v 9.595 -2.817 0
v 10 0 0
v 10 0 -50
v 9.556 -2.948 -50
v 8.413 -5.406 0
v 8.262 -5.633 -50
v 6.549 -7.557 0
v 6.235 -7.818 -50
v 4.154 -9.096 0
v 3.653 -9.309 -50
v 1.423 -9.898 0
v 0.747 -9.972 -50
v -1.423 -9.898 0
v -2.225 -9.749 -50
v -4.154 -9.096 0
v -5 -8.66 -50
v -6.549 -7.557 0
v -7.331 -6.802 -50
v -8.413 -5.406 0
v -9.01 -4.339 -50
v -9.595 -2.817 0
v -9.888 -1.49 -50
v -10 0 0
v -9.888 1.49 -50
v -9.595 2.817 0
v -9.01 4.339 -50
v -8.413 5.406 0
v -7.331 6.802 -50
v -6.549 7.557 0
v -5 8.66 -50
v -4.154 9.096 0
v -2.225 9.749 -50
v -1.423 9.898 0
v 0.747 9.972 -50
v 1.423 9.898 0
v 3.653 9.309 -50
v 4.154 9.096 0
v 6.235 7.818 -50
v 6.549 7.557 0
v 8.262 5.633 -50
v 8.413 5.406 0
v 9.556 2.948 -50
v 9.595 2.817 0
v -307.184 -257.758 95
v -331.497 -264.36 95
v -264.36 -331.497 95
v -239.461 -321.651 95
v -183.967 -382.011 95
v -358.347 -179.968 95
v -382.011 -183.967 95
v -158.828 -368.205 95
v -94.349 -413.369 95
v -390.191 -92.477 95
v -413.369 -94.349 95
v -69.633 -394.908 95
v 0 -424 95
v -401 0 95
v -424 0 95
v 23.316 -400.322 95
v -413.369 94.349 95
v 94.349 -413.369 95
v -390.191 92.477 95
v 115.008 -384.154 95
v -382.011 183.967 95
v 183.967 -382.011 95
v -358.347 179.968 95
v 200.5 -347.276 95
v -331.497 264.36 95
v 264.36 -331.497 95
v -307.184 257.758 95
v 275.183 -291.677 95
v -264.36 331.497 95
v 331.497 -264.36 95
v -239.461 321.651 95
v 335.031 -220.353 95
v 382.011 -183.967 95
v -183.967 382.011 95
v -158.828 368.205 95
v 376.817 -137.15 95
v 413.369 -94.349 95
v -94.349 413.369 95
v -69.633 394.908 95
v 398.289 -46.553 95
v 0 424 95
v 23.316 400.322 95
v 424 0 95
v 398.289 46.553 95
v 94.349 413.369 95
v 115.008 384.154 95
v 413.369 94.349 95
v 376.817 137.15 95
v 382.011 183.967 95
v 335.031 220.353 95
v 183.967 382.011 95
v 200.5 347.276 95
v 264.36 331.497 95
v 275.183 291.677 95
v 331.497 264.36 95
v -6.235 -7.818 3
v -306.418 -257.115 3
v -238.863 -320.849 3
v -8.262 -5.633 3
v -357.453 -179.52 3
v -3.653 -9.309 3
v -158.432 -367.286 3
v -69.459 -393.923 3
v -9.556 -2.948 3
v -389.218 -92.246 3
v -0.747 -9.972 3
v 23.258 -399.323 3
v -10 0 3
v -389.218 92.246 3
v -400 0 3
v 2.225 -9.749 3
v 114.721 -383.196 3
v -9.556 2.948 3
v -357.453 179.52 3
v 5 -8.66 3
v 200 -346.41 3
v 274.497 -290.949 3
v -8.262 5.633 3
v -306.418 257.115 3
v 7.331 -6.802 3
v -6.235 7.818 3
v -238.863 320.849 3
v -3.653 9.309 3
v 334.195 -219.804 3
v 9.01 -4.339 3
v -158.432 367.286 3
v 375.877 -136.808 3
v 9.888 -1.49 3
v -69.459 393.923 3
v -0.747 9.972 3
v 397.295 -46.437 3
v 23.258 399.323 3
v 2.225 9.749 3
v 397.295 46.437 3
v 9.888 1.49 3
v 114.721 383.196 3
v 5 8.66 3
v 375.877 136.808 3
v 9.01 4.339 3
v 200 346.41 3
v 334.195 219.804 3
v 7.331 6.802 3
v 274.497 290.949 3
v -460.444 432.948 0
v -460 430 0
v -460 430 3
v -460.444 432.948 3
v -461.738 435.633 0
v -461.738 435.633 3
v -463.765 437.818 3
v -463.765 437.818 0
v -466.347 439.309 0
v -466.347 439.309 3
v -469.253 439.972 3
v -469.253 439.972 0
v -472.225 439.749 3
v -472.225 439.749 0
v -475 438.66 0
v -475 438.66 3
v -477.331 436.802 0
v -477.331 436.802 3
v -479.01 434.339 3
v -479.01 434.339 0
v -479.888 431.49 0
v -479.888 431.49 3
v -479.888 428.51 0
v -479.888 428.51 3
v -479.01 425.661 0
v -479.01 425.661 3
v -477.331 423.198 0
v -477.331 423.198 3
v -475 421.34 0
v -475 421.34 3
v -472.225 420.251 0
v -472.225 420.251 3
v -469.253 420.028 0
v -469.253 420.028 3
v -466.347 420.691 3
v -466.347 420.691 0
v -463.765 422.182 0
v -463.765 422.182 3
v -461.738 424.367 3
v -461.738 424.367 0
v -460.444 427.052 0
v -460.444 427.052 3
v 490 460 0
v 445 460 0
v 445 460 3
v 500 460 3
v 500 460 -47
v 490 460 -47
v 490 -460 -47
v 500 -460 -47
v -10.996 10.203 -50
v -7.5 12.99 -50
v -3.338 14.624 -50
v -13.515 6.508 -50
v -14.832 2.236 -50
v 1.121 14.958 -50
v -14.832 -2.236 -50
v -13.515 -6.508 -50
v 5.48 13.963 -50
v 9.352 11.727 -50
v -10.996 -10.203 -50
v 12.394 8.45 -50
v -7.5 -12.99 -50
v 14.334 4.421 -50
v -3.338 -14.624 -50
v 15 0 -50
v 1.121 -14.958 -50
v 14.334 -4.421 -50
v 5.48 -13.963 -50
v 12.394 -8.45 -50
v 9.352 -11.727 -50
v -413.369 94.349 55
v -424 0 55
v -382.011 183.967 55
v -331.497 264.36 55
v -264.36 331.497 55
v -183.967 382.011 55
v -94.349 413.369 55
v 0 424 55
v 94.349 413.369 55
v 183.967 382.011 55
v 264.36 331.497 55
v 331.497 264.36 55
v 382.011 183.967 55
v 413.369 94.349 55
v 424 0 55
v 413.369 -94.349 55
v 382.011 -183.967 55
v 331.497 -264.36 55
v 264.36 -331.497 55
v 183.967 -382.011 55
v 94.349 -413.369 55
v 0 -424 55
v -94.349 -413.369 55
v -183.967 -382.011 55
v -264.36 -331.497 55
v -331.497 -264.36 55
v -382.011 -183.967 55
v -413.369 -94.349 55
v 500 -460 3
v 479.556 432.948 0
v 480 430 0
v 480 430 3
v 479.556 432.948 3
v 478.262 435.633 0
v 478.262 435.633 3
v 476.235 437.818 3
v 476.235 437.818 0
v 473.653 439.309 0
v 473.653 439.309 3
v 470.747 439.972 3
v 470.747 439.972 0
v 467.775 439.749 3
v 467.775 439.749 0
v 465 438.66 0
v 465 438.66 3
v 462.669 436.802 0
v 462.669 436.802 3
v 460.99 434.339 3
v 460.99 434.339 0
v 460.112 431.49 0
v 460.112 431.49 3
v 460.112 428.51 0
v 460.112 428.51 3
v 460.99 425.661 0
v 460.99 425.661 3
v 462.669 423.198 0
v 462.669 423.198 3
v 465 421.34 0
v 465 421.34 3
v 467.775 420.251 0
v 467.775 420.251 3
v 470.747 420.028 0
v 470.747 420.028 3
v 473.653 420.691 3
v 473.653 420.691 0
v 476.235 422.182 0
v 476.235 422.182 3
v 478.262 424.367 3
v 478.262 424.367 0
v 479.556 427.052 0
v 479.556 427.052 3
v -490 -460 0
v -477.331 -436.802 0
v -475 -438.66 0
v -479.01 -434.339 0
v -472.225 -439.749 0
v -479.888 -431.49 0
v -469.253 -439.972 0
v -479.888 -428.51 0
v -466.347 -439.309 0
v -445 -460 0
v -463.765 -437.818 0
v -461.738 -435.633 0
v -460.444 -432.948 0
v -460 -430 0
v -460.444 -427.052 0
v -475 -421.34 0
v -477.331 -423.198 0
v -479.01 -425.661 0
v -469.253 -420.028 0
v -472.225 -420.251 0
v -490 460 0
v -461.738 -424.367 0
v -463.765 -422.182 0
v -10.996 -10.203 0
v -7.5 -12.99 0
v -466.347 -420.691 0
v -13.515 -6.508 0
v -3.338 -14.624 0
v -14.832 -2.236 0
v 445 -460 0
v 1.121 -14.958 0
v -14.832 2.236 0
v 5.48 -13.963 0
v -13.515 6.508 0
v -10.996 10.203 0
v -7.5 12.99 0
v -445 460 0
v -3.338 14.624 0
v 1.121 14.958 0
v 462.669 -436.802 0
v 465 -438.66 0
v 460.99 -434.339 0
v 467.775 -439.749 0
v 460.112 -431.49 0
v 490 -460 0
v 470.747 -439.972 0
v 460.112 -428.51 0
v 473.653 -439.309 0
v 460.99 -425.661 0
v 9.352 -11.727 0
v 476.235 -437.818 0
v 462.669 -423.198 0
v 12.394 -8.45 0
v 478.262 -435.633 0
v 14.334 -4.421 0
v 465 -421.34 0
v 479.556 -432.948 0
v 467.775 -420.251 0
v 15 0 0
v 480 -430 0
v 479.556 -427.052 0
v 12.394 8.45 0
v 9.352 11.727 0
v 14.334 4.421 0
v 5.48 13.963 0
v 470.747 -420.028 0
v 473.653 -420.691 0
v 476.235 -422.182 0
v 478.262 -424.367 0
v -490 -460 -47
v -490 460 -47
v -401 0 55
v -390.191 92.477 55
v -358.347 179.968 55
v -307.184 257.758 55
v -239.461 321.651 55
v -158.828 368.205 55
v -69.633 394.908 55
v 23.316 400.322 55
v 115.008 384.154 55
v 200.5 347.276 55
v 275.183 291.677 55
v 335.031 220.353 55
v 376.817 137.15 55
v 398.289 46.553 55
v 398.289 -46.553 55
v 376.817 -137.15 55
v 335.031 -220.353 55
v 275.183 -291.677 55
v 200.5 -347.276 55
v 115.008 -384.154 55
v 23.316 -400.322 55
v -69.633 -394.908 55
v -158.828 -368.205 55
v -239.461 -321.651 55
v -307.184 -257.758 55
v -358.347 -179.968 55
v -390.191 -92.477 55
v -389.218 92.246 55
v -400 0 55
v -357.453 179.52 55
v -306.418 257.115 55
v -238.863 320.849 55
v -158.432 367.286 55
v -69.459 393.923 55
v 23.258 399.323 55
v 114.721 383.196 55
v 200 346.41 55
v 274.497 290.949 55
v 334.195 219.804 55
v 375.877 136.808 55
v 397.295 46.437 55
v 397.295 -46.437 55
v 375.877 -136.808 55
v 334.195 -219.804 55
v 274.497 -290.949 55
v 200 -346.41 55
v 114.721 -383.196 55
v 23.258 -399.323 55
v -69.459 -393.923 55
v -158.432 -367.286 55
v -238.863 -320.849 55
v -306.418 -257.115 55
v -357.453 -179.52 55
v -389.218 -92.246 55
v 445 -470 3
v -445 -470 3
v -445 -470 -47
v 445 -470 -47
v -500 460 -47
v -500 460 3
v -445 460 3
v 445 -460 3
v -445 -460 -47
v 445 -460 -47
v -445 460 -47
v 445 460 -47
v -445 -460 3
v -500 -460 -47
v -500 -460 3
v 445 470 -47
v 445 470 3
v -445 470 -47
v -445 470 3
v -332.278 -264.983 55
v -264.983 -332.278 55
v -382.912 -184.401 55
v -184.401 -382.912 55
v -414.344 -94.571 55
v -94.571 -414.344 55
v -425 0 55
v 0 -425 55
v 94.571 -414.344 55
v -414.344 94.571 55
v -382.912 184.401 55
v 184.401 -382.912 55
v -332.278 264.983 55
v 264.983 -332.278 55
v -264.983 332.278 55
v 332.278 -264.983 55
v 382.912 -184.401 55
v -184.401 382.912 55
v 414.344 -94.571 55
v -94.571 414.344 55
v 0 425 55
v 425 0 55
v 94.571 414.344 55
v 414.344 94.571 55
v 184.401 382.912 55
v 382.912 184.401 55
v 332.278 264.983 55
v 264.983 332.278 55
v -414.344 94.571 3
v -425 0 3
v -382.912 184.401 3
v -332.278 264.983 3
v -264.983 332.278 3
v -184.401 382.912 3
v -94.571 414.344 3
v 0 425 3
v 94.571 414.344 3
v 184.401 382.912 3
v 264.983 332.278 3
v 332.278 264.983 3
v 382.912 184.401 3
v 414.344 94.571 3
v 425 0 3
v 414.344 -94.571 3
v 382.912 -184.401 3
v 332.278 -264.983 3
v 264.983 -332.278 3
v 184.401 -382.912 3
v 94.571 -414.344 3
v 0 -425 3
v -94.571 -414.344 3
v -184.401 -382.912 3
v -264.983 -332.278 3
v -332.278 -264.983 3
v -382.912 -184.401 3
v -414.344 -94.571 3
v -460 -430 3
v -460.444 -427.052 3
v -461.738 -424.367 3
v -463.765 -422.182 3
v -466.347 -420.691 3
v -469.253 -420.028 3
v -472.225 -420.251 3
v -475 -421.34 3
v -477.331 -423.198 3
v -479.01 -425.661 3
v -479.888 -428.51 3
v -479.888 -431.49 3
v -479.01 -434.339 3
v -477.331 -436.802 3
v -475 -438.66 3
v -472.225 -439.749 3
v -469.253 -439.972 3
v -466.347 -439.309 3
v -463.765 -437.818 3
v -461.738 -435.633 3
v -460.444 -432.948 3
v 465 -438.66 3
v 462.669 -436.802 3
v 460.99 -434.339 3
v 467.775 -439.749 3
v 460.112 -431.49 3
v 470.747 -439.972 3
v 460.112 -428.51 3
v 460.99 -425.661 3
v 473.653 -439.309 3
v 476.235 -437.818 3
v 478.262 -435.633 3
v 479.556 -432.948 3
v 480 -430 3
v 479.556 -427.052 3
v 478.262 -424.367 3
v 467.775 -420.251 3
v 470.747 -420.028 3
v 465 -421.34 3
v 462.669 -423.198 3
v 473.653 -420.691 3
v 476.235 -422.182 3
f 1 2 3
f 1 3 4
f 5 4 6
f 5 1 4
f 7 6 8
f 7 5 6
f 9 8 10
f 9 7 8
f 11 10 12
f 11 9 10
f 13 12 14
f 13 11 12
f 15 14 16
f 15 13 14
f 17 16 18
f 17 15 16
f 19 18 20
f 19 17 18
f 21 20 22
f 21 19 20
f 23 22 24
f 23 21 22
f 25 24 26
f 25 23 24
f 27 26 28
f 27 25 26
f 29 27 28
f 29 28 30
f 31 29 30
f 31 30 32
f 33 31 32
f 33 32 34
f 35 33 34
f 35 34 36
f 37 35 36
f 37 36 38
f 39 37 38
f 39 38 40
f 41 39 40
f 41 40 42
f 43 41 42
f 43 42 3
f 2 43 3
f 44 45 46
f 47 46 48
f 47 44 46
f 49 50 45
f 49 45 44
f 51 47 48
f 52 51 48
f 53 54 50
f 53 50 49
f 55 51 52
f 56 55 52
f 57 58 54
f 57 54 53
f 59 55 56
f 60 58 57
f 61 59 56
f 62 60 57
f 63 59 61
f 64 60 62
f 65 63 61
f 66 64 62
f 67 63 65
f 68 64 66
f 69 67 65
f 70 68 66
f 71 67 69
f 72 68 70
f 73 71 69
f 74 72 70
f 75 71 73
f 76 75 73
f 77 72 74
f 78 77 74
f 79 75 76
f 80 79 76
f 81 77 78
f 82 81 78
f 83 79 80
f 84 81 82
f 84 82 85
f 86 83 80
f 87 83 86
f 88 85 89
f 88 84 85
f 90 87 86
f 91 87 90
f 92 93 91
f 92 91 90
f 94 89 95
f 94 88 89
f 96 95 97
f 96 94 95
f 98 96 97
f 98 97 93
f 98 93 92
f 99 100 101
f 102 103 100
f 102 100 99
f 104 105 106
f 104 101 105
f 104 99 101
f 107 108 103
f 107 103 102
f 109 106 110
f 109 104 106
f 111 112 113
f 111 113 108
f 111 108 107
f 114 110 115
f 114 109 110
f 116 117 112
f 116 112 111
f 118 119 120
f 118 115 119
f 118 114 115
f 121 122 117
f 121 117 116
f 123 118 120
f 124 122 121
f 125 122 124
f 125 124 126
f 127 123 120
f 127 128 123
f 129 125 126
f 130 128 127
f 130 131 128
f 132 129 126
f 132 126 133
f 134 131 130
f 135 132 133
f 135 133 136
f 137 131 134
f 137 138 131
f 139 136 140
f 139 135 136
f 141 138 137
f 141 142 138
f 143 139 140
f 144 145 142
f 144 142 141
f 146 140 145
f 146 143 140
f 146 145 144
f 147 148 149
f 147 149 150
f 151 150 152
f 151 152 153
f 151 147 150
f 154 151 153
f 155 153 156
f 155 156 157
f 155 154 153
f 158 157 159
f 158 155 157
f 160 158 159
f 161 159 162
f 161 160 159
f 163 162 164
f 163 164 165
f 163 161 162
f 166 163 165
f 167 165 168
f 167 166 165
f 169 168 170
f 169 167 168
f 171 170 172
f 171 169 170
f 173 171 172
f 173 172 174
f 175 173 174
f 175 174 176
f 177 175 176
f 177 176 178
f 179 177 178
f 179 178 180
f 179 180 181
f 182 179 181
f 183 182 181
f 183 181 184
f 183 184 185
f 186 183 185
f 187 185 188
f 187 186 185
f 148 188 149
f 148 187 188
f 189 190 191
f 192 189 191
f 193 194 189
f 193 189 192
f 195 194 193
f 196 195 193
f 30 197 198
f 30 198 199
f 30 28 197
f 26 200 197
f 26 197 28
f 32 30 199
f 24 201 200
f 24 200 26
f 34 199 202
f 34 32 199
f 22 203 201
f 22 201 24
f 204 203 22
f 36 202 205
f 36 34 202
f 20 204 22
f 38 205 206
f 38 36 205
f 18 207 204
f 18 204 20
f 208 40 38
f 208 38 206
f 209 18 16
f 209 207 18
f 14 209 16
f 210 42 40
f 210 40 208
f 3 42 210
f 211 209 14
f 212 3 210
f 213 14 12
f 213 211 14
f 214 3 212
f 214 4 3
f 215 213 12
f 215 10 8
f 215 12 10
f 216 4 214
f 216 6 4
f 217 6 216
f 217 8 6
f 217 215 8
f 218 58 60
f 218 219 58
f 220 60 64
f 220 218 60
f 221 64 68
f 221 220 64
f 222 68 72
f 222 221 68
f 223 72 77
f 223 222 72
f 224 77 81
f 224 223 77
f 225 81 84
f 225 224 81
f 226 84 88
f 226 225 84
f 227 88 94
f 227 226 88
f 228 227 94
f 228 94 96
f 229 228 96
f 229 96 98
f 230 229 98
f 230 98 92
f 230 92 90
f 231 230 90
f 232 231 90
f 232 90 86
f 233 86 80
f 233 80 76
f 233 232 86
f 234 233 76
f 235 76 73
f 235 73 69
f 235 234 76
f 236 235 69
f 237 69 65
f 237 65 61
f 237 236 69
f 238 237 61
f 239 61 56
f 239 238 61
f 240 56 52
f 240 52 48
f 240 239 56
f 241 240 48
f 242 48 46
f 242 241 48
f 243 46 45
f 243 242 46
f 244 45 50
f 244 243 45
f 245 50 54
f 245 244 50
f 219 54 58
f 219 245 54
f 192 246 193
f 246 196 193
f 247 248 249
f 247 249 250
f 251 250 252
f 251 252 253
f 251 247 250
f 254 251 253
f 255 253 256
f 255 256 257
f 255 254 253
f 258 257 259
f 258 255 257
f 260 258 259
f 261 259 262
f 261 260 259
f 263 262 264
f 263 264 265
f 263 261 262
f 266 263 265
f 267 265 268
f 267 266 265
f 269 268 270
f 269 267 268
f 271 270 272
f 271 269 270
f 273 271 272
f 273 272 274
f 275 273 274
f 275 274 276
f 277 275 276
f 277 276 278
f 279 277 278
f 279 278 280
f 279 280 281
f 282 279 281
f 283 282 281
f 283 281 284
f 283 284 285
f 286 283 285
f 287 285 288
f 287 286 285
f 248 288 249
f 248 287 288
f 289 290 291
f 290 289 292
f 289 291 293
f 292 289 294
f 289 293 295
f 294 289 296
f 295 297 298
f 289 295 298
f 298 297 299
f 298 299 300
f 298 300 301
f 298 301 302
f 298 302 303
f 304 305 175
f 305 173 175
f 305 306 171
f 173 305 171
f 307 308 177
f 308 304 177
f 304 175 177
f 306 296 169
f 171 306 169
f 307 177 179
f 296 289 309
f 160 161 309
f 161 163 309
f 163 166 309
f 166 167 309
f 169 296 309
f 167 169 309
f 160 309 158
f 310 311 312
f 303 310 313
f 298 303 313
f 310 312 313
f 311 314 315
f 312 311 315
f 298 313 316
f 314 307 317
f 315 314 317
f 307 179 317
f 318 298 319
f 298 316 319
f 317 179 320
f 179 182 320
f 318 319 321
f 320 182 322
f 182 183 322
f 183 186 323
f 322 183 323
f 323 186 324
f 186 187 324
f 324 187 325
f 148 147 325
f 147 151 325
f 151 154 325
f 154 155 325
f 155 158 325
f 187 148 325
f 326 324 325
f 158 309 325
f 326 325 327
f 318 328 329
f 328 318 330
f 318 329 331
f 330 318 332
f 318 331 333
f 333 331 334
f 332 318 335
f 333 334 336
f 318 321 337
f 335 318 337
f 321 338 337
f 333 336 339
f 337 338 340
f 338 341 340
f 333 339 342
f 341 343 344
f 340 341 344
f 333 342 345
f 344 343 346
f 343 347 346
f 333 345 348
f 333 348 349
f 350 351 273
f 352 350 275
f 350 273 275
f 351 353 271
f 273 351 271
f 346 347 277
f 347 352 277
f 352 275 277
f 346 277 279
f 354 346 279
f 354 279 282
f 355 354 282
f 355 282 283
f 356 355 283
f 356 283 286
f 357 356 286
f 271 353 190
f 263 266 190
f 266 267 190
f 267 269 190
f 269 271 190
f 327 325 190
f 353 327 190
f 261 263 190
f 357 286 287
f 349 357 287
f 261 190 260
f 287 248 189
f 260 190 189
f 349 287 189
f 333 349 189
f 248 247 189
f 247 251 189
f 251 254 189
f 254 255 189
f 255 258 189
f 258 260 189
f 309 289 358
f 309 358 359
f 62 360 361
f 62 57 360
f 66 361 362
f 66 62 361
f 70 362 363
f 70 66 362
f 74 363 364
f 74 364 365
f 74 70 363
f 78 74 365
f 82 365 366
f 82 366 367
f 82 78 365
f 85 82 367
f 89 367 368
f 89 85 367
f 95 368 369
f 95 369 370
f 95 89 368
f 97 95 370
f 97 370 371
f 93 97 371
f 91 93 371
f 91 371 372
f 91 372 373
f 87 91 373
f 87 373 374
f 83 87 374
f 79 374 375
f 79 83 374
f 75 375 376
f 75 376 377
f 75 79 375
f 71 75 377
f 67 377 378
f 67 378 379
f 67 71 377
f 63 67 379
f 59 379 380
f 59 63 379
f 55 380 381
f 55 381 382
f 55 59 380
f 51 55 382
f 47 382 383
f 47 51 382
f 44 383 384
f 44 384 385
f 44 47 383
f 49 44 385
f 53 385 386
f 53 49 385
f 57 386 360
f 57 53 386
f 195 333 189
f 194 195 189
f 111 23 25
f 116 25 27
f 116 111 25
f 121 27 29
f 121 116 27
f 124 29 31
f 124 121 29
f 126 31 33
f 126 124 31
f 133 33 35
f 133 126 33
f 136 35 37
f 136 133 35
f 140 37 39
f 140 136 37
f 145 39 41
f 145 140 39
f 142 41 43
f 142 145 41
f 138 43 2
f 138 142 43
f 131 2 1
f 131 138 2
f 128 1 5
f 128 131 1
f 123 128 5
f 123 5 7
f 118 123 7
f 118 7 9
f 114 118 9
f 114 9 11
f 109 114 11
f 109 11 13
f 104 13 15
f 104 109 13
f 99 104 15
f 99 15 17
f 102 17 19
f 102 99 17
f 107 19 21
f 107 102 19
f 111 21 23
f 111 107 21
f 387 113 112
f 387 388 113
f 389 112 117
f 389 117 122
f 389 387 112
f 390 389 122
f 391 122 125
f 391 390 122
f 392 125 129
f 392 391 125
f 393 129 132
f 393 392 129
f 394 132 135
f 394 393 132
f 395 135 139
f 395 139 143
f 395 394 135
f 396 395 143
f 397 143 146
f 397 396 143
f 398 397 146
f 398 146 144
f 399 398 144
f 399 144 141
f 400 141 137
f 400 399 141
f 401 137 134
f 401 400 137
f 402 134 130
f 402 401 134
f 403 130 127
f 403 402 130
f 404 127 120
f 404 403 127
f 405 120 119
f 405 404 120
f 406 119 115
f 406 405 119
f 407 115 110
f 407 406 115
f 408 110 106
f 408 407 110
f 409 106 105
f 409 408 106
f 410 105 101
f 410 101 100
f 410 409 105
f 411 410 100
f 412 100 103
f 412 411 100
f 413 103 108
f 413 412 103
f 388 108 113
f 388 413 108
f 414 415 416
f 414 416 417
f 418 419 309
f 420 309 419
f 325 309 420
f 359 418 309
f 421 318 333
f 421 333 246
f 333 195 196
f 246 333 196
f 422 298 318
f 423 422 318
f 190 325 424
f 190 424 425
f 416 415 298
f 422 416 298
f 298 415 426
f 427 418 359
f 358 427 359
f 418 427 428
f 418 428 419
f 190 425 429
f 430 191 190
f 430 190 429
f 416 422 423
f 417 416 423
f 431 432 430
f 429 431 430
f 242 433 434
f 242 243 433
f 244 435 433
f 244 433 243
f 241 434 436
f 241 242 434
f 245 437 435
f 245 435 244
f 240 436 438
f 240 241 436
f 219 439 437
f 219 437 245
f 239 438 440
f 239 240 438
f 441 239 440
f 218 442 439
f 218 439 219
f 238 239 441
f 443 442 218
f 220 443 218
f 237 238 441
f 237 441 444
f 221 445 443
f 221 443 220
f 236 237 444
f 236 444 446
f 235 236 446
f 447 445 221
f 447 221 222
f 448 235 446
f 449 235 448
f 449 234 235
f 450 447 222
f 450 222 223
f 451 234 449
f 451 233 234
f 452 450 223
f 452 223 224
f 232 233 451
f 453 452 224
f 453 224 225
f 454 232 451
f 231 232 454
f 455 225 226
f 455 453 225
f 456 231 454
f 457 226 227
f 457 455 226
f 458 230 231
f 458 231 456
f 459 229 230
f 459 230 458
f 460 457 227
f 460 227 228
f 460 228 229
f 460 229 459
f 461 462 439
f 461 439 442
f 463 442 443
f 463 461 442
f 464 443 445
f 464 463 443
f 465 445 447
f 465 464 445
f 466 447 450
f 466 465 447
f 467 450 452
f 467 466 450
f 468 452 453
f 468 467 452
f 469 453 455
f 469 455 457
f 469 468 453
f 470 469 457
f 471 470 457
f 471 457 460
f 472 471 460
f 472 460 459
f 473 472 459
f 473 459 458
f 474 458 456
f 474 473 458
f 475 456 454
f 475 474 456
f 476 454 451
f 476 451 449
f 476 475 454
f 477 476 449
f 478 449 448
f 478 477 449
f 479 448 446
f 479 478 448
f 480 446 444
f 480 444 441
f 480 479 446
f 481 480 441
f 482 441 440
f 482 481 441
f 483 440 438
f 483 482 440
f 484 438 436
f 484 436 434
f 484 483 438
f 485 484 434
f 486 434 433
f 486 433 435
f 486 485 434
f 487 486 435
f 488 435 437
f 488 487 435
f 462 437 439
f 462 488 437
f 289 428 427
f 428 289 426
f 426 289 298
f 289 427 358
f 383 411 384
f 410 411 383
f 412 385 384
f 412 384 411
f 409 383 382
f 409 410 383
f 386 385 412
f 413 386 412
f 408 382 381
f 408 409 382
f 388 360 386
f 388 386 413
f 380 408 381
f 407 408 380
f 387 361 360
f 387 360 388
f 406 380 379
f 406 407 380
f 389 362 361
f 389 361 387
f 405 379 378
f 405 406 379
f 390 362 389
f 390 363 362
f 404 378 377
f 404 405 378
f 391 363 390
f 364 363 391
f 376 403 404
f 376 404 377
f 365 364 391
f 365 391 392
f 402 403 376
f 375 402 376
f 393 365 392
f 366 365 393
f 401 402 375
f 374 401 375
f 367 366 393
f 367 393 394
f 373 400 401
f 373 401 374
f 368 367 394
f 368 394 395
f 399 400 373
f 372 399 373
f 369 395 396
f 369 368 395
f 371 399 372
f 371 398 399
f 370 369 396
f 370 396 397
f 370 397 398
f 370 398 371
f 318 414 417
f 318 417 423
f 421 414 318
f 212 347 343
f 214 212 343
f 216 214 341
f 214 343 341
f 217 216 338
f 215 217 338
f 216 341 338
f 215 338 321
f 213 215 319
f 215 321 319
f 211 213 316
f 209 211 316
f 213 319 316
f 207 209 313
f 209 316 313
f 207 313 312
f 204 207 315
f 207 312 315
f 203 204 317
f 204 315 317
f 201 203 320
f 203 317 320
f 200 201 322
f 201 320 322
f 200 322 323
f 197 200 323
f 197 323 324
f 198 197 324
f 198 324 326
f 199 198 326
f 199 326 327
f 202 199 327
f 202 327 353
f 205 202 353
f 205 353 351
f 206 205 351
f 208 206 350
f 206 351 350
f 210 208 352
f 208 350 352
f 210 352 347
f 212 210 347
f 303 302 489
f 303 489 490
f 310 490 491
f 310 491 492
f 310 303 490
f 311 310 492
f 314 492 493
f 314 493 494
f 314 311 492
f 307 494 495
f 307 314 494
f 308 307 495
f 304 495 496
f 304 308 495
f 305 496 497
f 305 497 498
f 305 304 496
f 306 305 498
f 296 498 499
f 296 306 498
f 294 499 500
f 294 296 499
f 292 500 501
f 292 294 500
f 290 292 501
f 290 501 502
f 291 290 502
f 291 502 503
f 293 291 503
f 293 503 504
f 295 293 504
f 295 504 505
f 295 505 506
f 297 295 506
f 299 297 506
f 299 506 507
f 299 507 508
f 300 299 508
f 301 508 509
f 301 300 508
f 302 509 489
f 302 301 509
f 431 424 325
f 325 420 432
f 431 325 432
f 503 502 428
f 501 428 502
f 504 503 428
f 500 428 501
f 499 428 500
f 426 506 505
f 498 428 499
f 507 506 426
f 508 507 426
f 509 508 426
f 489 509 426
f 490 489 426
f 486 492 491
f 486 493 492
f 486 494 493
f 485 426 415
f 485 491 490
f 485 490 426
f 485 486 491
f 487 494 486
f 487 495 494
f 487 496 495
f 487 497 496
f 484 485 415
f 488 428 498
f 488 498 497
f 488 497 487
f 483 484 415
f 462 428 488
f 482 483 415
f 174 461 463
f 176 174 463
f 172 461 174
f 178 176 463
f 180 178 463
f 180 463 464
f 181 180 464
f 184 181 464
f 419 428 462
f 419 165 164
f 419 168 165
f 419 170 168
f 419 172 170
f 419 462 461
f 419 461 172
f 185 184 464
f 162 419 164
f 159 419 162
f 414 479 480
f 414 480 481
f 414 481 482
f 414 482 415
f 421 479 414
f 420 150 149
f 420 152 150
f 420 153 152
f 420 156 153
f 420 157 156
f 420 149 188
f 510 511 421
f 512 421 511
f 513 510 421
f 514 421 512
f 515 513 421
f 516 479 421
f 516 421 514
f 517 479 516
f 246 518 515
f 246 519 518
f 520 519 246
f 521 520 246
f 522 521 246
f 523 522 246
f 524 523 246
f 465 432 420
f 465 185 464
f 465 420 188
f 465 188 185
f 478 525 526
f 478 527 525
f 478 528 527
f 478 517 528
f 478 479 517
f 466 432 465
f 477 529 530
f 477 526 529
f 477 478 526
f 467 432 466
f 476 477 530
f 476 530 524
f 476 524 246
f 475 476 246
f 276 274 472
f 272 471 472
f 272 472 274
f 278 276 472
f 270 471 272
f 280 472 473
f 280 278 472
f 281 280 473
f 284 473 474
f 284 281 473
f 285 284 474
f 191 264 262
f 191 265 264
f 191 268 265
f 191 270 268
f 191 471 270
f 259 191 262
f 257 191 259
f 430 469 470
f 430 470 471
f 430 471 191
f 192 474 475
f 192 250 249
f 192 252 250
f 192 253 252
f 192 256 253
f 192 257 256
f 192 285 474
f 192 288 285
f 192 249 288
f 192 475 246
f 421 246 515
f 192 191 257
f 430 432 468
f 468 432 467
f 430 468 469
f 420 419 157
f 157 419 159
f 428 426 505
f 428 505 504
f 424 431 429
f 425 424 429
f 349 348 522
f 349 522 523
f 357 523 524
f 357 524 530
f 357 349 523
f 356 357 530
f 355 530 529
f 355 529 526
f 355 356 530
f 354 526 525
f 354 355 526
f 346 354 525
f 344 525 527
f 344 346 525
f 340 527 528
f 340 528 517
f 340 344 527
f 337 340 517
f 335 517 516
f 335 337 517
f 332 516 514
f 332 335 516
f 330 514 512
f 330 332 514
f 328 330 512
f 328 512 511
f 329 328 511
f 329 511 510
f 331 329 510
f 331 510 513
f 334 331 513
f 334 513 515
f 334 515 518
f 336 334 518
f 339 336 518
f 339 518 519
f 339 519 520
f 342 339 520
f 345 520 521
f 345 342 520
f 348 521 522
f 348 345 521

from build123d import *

# Parameters (mm, degrees)
F2_W     = 1000
F2_H     = 920
F2_R     = 10
F2_R_2   = 401
F3_DEPTH = 3
F4_W     = 890
F4_H     = 10
F4_W_2   = 10
F4_H_2   = 920
F5_DEPTH = 50
F6_R     = 15
F6_R_2   = 10
F7_DEPTH = 50


with BuildPart() as f1:
    # F0 (on Front) → F1 (revolve)
    with BuildSketch(Plane.XZ):
        Polygon((-425, 3), (-400, 3), (-400, 55), (-401, 55), (-401, 95), (-424, 95), (-424, 55), (-425, 55), align=None)
        Polygon((-10, 3), (-400, 3), (-425, 3), (-425, 0), (-10, 0), align=None)
    revolve(axis=Axis((0, 0, 187.921241), (0, 0, -1)))

    # F2 (on Top) → F3 (join)
    with BuildSketch(Plane.XY):
        Rectangle(F2_W, F2_H)
        with Locations((-470, -430)):
            Circle(F2_R, mode=Mode.SUBTRACT)
        with Locations((470, -430)):
            Circle(F2_R, mode=Mode.SUBTRACT)
        with Locations((-470, 430)):
            Circle(F2_R, mode=Mode.SUBTRACT)
        Circle(F2_R_2, mode=Mode.SUBTRACT)
        with Locations((470, 430)):
            Circle(F2_R, mode=Mode.SUBTRACT)
    extrude(amount=F3_DEPTH)

    # F4 (on face) → F5 (join)
    with BuildSketch(Plane.XY.offset(3)):
        with Locations((0, -465)):
            Rectangle(F4_W, F4_H)
        with Locations((-495, 0)):
            Rectangle(F4_W_2, F4_H_2)
        with Locations((0, 465)):
            Rectangle(F4_W, F4_H)
        with Locations((495, 0)):
            Rectangle(F4_W_2, F4_H_2)
    extrude(amount=-F5_DEPTH)

    # F6 (on face) → F7 (join)
    with BuildSketch(Plane(origin=(0, 0, 0), x_dir=(1, 0, 0), z_dir=(0, 0, -1))):
        Circle(F6_R)
        Circle(F6_R_2, mode=Mode.SUBTRACT)
    extrude(amount=F7_DEPTH)


solid = f1.part
